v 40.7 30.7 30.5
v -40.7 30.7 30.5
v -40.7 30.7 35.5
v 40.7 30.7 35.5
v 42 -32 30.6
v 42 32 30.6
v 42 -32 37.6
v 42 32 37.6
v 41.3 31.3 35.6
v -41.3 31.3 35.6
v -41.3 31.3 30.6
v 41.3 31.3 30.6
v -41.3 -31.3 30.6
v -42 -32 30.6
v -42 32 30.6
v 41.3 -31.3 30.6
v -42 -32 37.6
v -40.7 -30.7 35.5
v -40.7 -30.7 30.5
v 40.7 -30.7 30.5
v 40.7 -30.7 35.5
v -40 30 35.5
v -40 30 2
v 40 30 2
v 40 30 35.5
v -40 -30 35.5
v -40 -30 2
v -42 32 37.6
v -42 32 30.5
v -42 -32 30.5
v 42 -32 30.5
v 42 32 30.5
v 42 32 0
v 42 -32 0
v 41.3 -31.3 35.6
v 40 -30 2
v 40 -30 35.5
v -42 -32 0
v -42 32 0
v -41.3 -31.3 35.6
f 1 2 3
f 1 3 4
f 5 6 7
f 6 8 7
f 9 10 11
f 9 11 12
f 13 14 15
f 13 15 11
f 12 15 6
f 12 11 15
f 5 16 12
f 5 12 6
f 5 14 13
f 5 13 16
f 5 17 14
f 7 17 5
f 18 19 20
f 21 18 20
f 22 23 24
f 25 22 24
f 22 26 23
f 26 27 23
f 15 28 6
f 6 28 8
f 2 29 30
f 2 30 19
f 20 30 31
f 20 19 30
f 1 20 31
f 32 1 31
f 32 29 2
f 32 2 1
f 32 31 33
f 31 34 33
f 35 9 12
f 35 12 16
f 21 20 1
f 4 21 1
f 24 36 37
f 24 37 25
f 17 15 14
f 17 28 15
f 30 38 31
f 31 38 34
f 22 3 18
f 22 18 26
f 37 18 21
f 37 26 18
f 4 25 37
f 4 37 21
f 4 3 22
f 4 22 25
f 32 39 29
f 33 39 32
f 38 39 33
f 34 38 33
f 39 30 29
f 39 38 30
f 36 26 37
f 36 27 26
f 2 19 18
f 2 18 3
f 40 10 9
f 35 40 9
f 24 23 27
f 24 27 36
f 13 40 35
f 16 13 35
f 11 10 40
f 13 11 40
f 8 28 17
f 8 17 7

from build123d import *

# Parameters (mm, degrees)
F0_W      = 84
F0_H      = 64
F1_DEPTH  = 2
F2_W      = 84
F2_H      = 64
F2_W_2    = 80
F2_H_2    = 60
F3_DEPTH  = 28.5
F4_W      = 81.4
F4_H      = 61.4
F4_W_2    = 80
F4_H_2    = 60
F5_DEPTH  = 5
F7_W      = 84
F7_H      = 64
F8_DEPTH  = 2
F9_W      = 84
F9_H      = 64
F9_W_2    = 82.6
F9_H_2    = 62.6
F10_DEPTH = 5


with BuildPart() as f1:
    # F0 (on Top) → F1 (new body)
    with BuildSketch(Plane.XY):
        Rectangle(F0_W, F0_H)
    extrude(amount=F1_DEPTH)

    # F2 (on face) → F3 (join)
    with BuildSketch(Plane.XY.offset(2)):
        Rectangle(F2_W, F2_H)
        Rectangle(F2_W_2, F2_H_2, mode=Mode.SUBTRACT)
    extrude(amount=F3_DEPTH)

    # F4 (on face) → F5 (join)
    with BuildSketch(Plane.XY.offset(30.5)):
        Rectangle(F4_W, F4_H)
        Rectangle(F4_W_2, F4_H_2, mode=Mode.SUBTRACT)
    extrude(amount=F5_DEPTH)


with BuildPart() as f8:
    # F7 (on offset) → F8 (new body)
    with BuildSketch(Plane.XY.offset(35.6)):
        Rectangle(F7_W, F7_H)
    extrude(amount=F8_DEPTH)

    # F9 (on face) → F10 (join)
    with BuildSketch(Plane(origin=(0, 0, 35.6), x_dir=(1, 0, 0), z_dir=(0, 0, -1))):
        Rectangle(F9_W, F9_H)
        Rectangle(F9_W_2, F9_H_2, mode=Mode.SUBTRACT)
    extrude(amount=F10_DEPTH)


solid = Compound([f1.part, f8.part])
